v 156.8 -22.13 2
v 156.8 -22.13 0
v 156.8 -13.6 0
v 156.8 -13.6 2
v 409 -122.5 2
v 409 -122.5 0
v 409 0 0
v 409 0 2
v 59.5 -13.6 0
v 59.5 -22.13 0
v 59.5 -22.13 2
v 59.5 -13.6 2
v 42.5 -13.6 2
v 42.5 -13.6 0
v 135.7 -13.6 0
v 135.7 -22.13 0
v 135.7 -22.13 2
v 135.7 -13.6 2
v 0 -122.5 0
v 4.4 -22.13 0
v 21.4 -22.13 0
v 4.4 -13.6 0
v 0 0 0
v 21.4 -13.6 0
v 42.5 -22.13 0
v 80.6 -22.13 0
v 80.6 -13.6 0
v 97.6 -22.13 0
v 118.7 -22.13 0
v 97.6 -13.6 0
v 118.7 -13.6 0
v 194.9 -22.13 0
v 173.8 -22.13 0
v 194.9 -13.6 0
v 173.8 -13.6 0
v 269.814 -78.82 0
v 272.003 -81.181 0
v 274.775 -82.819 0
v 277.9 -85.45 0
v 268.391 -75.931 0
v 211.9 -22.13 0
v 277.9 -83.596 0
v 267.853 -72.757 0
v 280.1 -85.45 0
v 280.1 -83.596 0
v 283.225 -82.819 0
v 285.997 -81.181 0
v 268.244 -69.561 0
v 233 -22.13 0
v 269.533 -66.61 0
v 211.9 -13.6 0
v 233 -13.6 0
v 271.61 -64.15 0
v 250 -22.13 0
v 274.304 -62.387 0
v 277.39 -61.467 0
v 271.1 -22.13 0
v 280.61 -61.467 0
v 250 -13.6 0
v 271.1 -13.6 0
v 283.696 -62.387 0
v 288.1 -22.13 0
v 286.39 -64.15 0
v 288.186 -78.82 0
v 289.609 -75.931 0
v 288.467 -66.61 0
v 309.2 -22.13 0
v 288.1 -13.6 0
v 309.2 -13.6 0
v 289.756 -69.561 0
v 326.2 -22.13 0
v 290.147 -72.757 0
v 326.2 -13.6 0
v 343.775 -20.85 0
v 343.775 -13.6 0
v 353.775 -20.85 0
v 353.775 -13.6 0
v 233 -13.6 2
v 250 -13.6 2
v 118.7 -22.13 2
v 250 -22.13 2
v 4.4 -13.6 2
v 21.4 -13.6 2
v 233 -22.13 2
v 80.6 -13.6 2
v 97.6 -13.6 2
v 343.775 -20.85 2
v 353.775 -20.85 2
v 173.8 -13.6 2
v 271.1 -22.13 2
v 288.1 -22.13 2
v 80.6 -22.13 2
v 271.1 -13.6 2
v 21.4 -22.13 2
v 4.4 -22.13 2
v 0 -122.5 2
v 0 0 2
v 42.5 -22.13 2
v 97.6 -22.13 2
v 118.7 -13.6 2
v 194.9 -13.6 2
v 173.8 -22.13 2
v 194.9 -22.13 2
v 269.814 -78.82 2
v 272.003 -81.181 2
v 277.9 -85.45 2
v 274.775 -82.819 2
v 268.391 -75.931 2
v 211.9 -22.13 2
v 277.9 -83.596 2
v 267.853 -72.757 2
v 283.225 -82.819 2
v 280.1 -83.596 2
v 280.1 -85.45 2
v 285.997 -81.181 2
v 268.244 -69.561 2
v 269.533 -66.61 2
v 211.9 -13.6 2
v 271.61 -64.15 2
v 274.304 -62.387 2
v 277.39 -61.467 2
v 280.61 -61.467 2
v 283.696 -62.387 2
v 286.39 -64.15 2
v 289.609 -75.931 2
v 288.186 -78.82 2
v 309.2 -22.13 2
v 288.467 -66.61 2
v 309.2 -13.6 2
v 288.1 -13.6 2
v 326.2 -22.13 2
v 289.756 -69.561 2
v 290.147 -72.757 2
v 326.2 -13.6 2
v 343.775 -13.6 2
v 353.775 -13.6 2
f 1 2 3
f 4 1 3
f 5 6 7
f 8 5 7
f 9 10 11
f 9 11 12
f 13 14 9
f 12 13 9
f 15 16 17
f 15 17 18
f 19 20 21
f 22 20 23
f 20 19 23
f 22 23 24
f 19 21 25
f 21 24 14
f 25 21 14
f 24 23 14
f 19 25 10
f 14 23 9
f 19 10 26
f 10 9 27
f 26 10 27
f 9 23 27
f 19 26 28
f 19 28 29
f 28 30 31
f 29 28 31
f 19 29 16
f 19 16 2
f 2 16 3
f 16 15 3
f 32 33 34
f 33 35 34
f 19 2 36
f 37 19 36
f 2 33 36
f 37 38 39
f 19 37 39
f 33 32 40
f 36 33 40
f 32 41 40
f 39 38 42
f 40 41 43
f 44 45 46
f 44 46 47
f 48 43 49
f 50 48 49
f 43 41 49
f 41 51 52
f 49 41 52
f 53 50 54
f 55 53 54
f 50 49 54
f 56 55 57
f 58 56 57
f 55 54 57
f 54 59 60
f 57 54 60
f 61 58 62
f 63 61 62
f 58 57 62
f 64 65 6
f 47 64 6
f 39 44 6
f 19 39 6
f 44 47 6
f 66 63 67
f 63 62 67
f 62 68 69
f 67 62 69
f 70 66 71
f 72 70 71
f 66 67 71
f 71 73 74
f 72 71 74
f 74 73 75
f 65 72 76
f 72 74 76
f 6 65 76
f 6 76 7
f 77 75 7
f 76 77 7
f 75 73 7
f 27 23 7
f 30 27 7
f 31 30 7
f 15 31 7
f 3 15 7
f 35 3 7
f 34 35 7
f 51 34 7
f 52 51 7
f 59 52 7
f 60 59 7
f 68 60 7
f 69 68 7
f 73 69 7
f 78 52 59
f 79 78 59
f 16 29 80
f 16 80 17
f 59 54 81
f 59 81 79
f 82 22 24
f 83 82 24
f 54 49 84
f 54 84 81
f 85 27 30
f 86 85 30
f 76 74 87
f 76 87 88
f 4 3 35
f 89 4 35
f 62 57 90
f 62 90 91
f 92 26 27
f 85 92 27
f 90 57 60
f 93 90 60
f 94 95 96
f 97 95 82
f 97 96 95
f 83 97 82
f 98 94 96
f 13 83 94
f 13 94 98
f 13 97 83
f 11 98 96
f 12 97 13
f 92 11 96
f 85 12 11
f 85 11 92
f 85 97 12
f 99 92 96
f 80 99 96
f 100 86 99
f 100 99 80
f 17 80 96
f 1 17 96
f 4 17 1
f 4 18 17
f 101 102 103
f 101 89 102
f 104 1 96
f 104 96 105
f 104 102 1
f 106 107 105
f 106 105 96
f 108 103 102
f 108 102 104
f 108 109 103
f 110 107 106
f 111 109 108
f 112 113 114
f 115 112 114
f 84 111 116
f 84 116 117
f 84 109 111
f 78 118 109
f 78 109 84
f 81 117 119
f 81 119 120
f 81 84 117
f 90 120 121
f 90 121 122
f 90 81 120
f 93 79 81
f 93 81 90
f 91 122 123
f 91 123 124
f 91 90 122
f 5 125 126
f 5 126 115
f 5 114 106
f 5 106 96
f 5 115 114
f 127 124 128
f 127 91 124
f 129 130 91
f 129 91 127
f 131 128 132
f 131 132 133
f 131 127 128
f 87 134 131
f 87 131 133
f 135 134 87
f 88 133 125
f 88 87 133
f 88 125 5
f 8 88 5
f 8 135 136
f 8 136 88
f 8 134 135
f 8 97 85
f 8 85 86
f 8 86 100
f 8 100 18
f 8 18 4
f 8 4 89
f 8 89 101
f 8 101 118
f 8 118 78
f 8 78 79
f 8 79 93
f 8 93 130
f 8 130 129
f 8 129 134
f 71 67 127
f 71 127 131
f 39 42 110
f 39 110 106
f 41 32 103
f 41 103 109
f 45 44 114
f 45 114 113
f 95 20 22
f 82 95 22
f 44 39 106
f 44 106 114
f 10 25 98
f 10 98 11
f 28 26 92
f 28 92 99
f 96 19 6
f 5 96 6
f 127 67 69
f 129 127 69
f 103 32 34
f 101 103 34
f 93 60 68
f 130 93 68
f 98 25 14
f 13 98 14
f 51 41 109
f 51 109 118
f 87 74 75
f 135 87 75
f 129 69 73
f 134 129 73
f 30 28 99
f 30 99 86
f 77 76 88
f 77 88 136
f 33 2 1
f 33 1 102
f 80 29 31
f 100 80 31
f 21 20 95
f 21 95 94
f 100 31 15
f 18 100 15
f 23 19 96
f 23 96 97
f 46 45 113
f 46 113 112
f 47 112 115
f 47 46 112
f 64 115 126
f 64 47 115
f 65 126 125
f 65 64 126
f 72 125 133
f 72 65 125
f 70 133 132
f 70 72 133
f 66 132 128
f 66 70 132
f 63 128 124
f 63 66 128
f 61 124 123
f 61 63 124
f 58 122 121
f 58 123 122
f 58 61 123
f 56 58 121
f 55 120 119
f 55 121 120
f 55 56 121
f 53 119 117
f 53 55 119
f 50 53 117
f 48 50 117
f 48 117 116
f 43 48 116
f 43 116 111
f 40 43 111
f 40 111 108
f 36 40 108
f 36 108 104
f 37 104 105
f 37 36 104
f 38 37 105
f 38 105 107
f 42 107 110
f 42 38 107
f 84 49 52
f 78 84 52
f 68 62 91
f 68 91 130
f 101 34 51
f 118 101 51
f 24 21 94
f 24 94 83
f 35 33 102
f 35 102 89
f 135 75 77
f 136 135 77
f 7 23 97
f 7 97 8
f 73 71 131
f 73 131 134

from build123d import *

# Parameters (mm, degrees)
SKETCH1_W               = 409
SKETCH1_H               = 122.5
BOSS_EXTRUDE1_DEPTH     = 2
CUT_EXTRUDE2_DEPTH      = 427.955793965
CUT_EXTRUDE2_DEPTH_BACK = 427.955793965
SKETCH2_W               = 17
SKETCH2_H               = 8.53
SKETCH2_W_2             = 10
SKETCH2_H_2             = 7.25


with BuildPart() as part:
    # Sketch1 → Boss-Extrude1 (new body)
    with BuildSketch(Plane.XY):
        with Locations((204.5, -61.25)):
            Rectangle(SKETCH1_W, SKETCH1_H)
    extrude(amount=BOSS_EXTRUDE1_DEPTH)

    # Sketch2 → Cut-Extrude2 (cut, two sides: drawn at the far end of the back side and taken through both)
    with BuildSketch(Plane.XY.offset(2).offset(-CUT_EXTRUDE2_DEPTH_BACK)):
        with Locations((12.9, -17.865)):
            Rectangle(SKETCH2_W, SKETCH2_H)
        with Locations((51, -17.865)):
            Rectangle(SKETCH2_W, SKETCH2_H)
        with Locations((89.1, -17.865)):
            Rectangle(SKETCH2_W, SKETCH2_H)
        with Locations((127.2, -17.865)):
            Rectangle(SKETCH2_W, SKETCH2_H)
        with Locations((165.3, -17.865)):
            Rectangle(SKETCH2_W, SKETCH2_H)
        with Locations((203.4, -17.865)):
            Rectangle(SKETCH2_W, SKETCH2_H)
        with Locations((279.6, -17.865)):
            Rectangle(SKETCH2_W, SKETCH2_H)
        with Locations((241.5, -17.865)):
            Rectangle(SKETCH2_W, SKETCH2_H)
        with Locations((317.7, -17.865)):
            Rectangle(SKETCH2_W, SKETCH2_H)
        with Locations((348.775, -17.225)):
            Rectangle(SKETCH2_W_2, SKETCH2_H_2)
        with BuildLine():
            Line((280.1, -85.45), (280.1, -83.595607239))
            ThreePointArc((280.1, -83.595607239), (279, -61.35), (277.9, -83.595607239))
            Line((277.9, -83.595607239), (277.9, -85.45))
            Line((277.9, -85.45), (280.1, -85.45))
        make_face()
    extrude(amount=CUT_EXTRUDE2_DEPTH + CUT_EXTRUDE2_DEPTH_BACK, mode=Mode.SUBTRACT)


solid = part.part
